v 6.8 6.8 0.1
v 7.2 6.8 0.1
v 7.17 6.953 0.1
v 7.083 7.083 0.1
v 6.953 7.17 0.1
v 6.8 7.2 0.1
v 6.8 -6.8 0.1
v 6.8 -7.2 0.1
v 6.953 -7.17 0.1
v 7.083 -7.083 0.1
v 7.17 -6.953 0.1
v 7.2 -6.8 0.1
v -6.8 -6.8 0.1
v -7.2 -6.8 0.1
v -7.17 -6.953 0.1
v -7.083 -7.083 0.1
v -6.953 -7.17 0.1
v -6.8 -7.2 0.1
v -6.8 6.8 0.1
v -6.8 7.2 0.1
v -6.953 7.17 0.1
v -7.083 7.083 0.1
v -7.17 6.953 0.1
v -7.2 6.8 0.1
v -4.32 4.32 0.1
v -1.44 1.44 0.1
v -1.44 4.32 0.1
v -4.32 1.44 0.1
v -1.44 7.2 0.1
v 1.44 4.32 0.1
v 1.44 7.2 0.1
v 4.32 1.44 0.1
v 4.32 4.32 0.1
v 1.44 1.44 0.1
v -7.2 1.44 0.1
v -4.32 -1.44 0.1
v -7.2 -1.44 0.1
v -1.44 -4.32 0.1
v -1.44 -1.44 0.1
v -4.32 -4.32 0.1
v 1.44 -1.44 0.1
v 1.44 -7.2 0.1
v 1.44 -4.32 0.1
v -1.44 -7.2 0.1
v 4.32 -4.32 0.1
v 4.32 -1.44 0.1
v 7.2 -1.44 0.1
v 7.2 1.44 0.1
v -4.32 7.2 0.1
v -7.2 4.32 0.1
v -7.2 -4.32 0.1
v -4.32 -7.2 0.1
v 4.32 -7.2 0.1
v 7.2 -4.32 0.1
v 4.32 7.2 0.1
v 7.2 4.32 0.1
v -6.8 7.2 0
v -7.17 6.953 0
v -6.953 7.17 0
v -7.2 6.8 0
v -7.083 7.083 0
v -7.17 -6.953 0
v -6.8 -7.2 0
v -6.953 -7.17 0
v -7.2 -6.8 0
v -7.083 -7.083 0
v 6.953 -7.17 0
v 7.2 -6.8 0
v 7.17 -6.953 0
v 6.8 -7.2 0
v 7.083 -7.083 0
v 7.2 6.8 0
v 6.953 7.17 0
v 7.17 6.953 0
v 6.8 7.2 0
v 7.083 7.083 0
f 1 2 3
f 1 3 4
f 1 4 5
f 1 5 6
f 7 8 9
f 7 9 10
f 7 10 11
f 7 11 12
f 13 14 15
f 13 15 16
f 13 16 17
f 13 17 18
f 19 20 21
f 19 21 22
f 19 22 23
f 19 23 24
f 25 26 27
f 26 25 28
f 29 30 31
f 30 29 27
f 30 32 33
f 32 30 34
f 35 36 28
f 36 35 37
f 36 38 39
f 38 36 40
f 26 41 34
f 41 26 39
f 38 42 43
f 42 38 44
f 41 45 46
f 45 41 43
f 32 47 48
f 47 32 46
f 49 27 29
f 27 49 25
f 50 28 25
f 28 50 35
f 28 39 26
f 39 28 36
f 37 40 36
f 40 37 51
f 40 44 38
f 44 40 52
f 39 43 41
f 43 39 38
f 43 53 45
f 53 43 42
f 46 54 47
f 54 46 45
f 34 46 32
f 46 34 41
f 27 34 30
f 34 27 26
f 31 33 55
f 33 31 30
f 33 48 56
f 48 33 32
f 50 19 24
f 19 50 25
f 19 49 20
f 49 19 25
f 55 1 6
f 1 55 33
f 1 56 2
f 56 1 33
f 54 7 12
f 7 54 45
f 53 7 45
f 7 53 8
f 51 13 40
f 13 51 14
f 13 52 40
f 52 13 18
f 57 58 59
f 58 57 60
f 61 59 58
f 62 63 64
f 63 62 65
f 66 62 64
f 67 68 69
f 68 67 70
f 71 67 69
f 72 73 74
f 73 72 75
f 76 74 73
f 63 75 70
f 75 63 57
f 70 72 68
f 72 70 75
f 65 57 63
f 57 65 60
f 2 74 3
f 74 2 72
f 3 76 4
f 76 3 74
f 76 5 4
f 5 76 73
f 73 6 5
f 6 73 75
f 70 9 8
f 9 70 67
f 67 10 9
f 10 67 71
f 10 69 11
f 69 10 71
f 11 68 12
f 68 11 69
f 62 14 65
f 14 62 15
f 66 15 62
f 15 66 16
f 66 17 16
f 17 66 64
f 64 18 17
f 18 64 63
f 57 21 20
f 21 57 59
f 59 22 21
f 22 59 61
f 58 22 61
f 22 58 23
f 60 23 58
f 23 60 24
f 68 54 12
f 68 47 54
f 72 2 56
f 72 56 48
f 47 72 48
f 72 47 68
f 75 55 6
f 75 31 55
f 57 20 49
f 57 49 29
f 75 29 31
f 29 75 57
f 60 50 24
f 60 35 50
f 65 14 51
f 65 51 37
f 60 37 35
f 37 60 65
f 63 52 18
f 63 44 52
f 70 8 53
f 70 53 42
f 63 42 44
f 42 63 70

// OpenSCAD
// file: ../p/1-4disc.scad
use <../lib.scad>
function ldraw_lib__1_4disc() = [
// 0 Disc 0.25
// 0 Name: 1-4disc.dat
// 0 Author: James Jessiman
// 0 !LDRAW_ORG Primitive UPDATE 2002-02
// 0 !LICENSE Licensed under CC BY 4.0 : see CAreadme.txt
// 
// 0 BFC CERTIFY CCW
  [0,"BFC","CERTIFY"],
  [0,"BFC","CCW"],
// 
// 0 !HISTORY 2002-03-23 [sbliss] Added BFC statement.
// 0 !HISTORY 2002-04-25 [PTadmin] Official Update 2002-02
// 0 !HISTORY 2007-06-22 [PTadmin] Header formatted for Contributor Agreement
// 0 !HISTORY 2008-07-01 [PTadmin] Official Update 2008-01
// 
// 
// 3 16 0 0 0 1 0 0 0.9239 0 0.3827
  [3,16,0,0,0,1,0,0,0.9239,0,0.3827],
// 3 16 0 0 0 0.9239 0 0.3827 0.7071 0 0.7071
  [3,16,0,0,0,0.9239,0,0.3827,0.7071,0,0.7071],
// 3 16 0 0 0 0.7071 0 0.7071 0.3827 0 0.9239
  [3,16,0,0,0,0.7071,0,0.7071,0.3827,0,0.9239],
// 3 16 0 0 0 0.3827 0 0.9239 0 0 1
  [3,16,0,0,0,0.3827,0,0.9239,0,0,1],
// 0
];
module ldraw_lib__1_4disc(step=0, col=false, unit=2/5, alt=false, line=0.2, solid=!$preview)
    makepoly(ldraw_lib__1_4disc(), step=step, col=col, unit=unit, alt=alt, line=line, solid=solid);
ldraw_lib__1_4disc(line=0.2);
// file: ../p/1-4cyli.scad
use <../lib.scad>
function ldraw_lib__1_4cyli() = [
// 0 Cylinder 0.25
// 0 Name: 1-4cyli.dat
// 0 Author: James Jessiman
// 0 !LDRAW_ORG Primitive UPDATE 2012-01
// 0 !LICENSE Licensed under CC BY 4.0 : see CAreadme.txt
// 
// 0 BFC CERTIFY CCW
  [0,"BFC","CERTIFY"],
  [0,"BFC","CCW"],
// 
// 0 !HISTORY 2002-03-23 [sbliss] Added BFC statement.
// 0 !HISTORY 2002-04-25 [PTadmin] Official Update 2002-02
// 0 !HISTORY 2007-06-22 [PTadmin] Header formatted for Contributor Agreement
// 0 !HISTORY 2008-07-01 [PTadmin] Official Update 2008-01
// 0 !HISTORY 2012-02-16 [Philo] Changed to CCW
// 0 !HISTORY 2012-03-30 [PTadmin] Official Update 2012-01
// 
// 
// 4 16 1 1 0 0.9239 1 0.3827 0.9239 0 0.3827 1 0 0
  [4,16,1,1,0,0.9239,1,0.3827,0.9239,0,0.3827,1,0,0],
// 5 24 1 0 0 1 1 0 0.9239 0 0.3827 1 0 -1
  [5,24,1,0,0,1,1,0,0.9239,0,0.3827,1,0,-1],
// 4 16 0.9239 1 0.3827 0.7071 1 0.7071 0.7071 0 0.7071 0.9239 0 0.3827
  [4,16,0.9239,1,0.3827,0.7071,1,0.7071,0.7071,0,0.7071,0.9239,0,0.3827],
// 5 24 0.9239 0 0.3827 0.9239 1 0.3827 0.7071 0 0.7071 1 0 0
  [5,24,0.9239,0,0.3827,0.9239,1,0.3827,0.7071,0,0.7071,1,0,0],
// 4 16 0.7071 1 0.7071 0.3827 1 0.9239 0.3827 0 0.9239 0.7071 0 0.7071
  [4,16,0.7071,1,0.7071,0.3827,1,0.9239,0.3827,0,0.9239,0.7071,0,0.7071],
// 5 24 0.7071 0 0.7071 0.7071 1 0.7071 0.3827 0 0.9239 0.9239 0 0.3827
  [5,24,0.7071,0,0.7071,0.7071,1,0.7071,0.3827,0,0.9239,0.9239,0,0.3827],
// 4 16 0.3827 1 0.9239 0 1 1 0 0 1 0.3827 0 0.9239
  [4,16,0.3827,1,0.9239,0,1,1,0,0,1,0.3827,0,0.9239],
// 5 24 0.3827 0 0.9239 0.3827 1 0.9239 0 0 1 0.7071 0 0.7071
  [5,24,0.3827,0,0.9239,0.3827,1,0.9239,0,0,1,0.7071,0,0.7071],
// 5 24 0 0 1 0 1 1 0.3827 0 0.9239 -1 0 1
  [5,24,0,0,1,0,1,1,0.3827,0,0.9239,-1,0,1],
];
module ldraw_lib__1_4cyli(step=0, col=false, unit=2/5, alt=false, line=0.2, solid=!$preview)
    makepoly(ldraw_lib__1_4cyli(), step=step, col=col, unit=unit, alt=alt, line=line, solid=solid);
ldraw_lib__1_4cyli(line=0.2);
// file: ../p/1-4chrd.scad
use <../lib.scad>
function ldraw_lib__1_4chrd() = [
// 0 Chord 0.25
// 0 Name: 1-4chrd.dat
// 0 Author: Max Martin Richter [MMR1988]
// 0 !LDRAW_ORG Primitive UPDATE 2023-05
// 0 !LICENSE Licensed under CC BY 4.0 : see CAreadme.txt
// 
// 0 BFC CERTIFY CCW
  [0,"BFC","CERTIFY"],
  [0,"BFC","CCW"],
// 
// 0 !HISTORY 2004-04-22 [PTadmin] Official Update 2004-02
// 0 !HISTORY 2007-10-09 [PTadmin] Header formatted for Contributor Agreement
// 0 !HISTORY 2008-07-01 [PTadmin] Official Update 2008-01
// 0 !HISTORY 2012-08-02 [MMR1988] Re-creation with PrimGen2 and Rectifier
// 0 !HISTORY 2012-08-09 [PTadmin] Official Update 2012-02
// 0 !HISTORY 2023-10-27 [OrionP] Change author to MMR1988 from hafhead
// 0 !HISTORY 2023-10-31 [OrionP] Official Update 2023-05
// 
// 4 16 0.9239 0 0.3827 0.3827 0 0.9239 0 0 1 1 0 0
  [4,16,0.9239,0,0.3827,0.3827,0,0.9239,0,0,1,1,0,0],
// 3 16 0.7071 0 0.7071 0.3827 0 0.9239 0.9239 0 0.3827
  [3,16,0.7071,0,0.7071,0.3827,0,0.9239,0.9239,0,0.3827],
];
module ldraw_lib__1_4chrd(step=0, col=false, unit=2/5, alt=false, line=0.2, solid=!$preview)
    makepoly(ldraw_lib__1_4chrd(), step=step, col=col, unit=unit, alt=alt, line=line, solid=solid);
ldraw_lib__1_4chrd(line=0.2);
// main file
use <../lib.scad>
use <4624296a.scad>
function ldraw_lib__4622048a() = [
// 0 =Sticker  1.8 x  1.8 with Black and White Squares
// 0 Name: 4622048a.dat
// 0 Author: Gabriel Läufer [Dr.Bricktacular]
// 0 !LDRAW_ORG Part Alias UPDATE 2024-11
// 0 !LICENSE Licensed under CC BY 4.0 : see CAreadme.txt
// 
// 0 BFC CERTIFY CCW
  [0,"BFC","CERTIFY"],
  [0,"BFC","CCW"],
// 
// 0 !KEYWORDS Bricklink 8423stk01, Cars 2, Set 8423
// 0 !KEYWORDS World Grand Prix Racing Rivalry
// 
// 0 !HISTORY 2024-12-30 [OrionP] Official Update 2024-11
// 
// 0 // Sticker-Front
// 1 16 0 0 0 1 0 0 0 1 0 0 0 1 4624296a.dat
  [1,16,0,0,0,1,0,0,0,1,0,0,0,1, ldraw_lib__4624296a()],
];
module ldraw_lib__4622048a(step=0, col=false, unit=2/5, alt=false, line=0.2, solid=!$preview)
    makepoly(ldraw_lib__4622048a(), step=step, col=col, unit=unit, alt=alt, line=line, solid=solid);
ldraw_lib__4622048a(line=0.2);
